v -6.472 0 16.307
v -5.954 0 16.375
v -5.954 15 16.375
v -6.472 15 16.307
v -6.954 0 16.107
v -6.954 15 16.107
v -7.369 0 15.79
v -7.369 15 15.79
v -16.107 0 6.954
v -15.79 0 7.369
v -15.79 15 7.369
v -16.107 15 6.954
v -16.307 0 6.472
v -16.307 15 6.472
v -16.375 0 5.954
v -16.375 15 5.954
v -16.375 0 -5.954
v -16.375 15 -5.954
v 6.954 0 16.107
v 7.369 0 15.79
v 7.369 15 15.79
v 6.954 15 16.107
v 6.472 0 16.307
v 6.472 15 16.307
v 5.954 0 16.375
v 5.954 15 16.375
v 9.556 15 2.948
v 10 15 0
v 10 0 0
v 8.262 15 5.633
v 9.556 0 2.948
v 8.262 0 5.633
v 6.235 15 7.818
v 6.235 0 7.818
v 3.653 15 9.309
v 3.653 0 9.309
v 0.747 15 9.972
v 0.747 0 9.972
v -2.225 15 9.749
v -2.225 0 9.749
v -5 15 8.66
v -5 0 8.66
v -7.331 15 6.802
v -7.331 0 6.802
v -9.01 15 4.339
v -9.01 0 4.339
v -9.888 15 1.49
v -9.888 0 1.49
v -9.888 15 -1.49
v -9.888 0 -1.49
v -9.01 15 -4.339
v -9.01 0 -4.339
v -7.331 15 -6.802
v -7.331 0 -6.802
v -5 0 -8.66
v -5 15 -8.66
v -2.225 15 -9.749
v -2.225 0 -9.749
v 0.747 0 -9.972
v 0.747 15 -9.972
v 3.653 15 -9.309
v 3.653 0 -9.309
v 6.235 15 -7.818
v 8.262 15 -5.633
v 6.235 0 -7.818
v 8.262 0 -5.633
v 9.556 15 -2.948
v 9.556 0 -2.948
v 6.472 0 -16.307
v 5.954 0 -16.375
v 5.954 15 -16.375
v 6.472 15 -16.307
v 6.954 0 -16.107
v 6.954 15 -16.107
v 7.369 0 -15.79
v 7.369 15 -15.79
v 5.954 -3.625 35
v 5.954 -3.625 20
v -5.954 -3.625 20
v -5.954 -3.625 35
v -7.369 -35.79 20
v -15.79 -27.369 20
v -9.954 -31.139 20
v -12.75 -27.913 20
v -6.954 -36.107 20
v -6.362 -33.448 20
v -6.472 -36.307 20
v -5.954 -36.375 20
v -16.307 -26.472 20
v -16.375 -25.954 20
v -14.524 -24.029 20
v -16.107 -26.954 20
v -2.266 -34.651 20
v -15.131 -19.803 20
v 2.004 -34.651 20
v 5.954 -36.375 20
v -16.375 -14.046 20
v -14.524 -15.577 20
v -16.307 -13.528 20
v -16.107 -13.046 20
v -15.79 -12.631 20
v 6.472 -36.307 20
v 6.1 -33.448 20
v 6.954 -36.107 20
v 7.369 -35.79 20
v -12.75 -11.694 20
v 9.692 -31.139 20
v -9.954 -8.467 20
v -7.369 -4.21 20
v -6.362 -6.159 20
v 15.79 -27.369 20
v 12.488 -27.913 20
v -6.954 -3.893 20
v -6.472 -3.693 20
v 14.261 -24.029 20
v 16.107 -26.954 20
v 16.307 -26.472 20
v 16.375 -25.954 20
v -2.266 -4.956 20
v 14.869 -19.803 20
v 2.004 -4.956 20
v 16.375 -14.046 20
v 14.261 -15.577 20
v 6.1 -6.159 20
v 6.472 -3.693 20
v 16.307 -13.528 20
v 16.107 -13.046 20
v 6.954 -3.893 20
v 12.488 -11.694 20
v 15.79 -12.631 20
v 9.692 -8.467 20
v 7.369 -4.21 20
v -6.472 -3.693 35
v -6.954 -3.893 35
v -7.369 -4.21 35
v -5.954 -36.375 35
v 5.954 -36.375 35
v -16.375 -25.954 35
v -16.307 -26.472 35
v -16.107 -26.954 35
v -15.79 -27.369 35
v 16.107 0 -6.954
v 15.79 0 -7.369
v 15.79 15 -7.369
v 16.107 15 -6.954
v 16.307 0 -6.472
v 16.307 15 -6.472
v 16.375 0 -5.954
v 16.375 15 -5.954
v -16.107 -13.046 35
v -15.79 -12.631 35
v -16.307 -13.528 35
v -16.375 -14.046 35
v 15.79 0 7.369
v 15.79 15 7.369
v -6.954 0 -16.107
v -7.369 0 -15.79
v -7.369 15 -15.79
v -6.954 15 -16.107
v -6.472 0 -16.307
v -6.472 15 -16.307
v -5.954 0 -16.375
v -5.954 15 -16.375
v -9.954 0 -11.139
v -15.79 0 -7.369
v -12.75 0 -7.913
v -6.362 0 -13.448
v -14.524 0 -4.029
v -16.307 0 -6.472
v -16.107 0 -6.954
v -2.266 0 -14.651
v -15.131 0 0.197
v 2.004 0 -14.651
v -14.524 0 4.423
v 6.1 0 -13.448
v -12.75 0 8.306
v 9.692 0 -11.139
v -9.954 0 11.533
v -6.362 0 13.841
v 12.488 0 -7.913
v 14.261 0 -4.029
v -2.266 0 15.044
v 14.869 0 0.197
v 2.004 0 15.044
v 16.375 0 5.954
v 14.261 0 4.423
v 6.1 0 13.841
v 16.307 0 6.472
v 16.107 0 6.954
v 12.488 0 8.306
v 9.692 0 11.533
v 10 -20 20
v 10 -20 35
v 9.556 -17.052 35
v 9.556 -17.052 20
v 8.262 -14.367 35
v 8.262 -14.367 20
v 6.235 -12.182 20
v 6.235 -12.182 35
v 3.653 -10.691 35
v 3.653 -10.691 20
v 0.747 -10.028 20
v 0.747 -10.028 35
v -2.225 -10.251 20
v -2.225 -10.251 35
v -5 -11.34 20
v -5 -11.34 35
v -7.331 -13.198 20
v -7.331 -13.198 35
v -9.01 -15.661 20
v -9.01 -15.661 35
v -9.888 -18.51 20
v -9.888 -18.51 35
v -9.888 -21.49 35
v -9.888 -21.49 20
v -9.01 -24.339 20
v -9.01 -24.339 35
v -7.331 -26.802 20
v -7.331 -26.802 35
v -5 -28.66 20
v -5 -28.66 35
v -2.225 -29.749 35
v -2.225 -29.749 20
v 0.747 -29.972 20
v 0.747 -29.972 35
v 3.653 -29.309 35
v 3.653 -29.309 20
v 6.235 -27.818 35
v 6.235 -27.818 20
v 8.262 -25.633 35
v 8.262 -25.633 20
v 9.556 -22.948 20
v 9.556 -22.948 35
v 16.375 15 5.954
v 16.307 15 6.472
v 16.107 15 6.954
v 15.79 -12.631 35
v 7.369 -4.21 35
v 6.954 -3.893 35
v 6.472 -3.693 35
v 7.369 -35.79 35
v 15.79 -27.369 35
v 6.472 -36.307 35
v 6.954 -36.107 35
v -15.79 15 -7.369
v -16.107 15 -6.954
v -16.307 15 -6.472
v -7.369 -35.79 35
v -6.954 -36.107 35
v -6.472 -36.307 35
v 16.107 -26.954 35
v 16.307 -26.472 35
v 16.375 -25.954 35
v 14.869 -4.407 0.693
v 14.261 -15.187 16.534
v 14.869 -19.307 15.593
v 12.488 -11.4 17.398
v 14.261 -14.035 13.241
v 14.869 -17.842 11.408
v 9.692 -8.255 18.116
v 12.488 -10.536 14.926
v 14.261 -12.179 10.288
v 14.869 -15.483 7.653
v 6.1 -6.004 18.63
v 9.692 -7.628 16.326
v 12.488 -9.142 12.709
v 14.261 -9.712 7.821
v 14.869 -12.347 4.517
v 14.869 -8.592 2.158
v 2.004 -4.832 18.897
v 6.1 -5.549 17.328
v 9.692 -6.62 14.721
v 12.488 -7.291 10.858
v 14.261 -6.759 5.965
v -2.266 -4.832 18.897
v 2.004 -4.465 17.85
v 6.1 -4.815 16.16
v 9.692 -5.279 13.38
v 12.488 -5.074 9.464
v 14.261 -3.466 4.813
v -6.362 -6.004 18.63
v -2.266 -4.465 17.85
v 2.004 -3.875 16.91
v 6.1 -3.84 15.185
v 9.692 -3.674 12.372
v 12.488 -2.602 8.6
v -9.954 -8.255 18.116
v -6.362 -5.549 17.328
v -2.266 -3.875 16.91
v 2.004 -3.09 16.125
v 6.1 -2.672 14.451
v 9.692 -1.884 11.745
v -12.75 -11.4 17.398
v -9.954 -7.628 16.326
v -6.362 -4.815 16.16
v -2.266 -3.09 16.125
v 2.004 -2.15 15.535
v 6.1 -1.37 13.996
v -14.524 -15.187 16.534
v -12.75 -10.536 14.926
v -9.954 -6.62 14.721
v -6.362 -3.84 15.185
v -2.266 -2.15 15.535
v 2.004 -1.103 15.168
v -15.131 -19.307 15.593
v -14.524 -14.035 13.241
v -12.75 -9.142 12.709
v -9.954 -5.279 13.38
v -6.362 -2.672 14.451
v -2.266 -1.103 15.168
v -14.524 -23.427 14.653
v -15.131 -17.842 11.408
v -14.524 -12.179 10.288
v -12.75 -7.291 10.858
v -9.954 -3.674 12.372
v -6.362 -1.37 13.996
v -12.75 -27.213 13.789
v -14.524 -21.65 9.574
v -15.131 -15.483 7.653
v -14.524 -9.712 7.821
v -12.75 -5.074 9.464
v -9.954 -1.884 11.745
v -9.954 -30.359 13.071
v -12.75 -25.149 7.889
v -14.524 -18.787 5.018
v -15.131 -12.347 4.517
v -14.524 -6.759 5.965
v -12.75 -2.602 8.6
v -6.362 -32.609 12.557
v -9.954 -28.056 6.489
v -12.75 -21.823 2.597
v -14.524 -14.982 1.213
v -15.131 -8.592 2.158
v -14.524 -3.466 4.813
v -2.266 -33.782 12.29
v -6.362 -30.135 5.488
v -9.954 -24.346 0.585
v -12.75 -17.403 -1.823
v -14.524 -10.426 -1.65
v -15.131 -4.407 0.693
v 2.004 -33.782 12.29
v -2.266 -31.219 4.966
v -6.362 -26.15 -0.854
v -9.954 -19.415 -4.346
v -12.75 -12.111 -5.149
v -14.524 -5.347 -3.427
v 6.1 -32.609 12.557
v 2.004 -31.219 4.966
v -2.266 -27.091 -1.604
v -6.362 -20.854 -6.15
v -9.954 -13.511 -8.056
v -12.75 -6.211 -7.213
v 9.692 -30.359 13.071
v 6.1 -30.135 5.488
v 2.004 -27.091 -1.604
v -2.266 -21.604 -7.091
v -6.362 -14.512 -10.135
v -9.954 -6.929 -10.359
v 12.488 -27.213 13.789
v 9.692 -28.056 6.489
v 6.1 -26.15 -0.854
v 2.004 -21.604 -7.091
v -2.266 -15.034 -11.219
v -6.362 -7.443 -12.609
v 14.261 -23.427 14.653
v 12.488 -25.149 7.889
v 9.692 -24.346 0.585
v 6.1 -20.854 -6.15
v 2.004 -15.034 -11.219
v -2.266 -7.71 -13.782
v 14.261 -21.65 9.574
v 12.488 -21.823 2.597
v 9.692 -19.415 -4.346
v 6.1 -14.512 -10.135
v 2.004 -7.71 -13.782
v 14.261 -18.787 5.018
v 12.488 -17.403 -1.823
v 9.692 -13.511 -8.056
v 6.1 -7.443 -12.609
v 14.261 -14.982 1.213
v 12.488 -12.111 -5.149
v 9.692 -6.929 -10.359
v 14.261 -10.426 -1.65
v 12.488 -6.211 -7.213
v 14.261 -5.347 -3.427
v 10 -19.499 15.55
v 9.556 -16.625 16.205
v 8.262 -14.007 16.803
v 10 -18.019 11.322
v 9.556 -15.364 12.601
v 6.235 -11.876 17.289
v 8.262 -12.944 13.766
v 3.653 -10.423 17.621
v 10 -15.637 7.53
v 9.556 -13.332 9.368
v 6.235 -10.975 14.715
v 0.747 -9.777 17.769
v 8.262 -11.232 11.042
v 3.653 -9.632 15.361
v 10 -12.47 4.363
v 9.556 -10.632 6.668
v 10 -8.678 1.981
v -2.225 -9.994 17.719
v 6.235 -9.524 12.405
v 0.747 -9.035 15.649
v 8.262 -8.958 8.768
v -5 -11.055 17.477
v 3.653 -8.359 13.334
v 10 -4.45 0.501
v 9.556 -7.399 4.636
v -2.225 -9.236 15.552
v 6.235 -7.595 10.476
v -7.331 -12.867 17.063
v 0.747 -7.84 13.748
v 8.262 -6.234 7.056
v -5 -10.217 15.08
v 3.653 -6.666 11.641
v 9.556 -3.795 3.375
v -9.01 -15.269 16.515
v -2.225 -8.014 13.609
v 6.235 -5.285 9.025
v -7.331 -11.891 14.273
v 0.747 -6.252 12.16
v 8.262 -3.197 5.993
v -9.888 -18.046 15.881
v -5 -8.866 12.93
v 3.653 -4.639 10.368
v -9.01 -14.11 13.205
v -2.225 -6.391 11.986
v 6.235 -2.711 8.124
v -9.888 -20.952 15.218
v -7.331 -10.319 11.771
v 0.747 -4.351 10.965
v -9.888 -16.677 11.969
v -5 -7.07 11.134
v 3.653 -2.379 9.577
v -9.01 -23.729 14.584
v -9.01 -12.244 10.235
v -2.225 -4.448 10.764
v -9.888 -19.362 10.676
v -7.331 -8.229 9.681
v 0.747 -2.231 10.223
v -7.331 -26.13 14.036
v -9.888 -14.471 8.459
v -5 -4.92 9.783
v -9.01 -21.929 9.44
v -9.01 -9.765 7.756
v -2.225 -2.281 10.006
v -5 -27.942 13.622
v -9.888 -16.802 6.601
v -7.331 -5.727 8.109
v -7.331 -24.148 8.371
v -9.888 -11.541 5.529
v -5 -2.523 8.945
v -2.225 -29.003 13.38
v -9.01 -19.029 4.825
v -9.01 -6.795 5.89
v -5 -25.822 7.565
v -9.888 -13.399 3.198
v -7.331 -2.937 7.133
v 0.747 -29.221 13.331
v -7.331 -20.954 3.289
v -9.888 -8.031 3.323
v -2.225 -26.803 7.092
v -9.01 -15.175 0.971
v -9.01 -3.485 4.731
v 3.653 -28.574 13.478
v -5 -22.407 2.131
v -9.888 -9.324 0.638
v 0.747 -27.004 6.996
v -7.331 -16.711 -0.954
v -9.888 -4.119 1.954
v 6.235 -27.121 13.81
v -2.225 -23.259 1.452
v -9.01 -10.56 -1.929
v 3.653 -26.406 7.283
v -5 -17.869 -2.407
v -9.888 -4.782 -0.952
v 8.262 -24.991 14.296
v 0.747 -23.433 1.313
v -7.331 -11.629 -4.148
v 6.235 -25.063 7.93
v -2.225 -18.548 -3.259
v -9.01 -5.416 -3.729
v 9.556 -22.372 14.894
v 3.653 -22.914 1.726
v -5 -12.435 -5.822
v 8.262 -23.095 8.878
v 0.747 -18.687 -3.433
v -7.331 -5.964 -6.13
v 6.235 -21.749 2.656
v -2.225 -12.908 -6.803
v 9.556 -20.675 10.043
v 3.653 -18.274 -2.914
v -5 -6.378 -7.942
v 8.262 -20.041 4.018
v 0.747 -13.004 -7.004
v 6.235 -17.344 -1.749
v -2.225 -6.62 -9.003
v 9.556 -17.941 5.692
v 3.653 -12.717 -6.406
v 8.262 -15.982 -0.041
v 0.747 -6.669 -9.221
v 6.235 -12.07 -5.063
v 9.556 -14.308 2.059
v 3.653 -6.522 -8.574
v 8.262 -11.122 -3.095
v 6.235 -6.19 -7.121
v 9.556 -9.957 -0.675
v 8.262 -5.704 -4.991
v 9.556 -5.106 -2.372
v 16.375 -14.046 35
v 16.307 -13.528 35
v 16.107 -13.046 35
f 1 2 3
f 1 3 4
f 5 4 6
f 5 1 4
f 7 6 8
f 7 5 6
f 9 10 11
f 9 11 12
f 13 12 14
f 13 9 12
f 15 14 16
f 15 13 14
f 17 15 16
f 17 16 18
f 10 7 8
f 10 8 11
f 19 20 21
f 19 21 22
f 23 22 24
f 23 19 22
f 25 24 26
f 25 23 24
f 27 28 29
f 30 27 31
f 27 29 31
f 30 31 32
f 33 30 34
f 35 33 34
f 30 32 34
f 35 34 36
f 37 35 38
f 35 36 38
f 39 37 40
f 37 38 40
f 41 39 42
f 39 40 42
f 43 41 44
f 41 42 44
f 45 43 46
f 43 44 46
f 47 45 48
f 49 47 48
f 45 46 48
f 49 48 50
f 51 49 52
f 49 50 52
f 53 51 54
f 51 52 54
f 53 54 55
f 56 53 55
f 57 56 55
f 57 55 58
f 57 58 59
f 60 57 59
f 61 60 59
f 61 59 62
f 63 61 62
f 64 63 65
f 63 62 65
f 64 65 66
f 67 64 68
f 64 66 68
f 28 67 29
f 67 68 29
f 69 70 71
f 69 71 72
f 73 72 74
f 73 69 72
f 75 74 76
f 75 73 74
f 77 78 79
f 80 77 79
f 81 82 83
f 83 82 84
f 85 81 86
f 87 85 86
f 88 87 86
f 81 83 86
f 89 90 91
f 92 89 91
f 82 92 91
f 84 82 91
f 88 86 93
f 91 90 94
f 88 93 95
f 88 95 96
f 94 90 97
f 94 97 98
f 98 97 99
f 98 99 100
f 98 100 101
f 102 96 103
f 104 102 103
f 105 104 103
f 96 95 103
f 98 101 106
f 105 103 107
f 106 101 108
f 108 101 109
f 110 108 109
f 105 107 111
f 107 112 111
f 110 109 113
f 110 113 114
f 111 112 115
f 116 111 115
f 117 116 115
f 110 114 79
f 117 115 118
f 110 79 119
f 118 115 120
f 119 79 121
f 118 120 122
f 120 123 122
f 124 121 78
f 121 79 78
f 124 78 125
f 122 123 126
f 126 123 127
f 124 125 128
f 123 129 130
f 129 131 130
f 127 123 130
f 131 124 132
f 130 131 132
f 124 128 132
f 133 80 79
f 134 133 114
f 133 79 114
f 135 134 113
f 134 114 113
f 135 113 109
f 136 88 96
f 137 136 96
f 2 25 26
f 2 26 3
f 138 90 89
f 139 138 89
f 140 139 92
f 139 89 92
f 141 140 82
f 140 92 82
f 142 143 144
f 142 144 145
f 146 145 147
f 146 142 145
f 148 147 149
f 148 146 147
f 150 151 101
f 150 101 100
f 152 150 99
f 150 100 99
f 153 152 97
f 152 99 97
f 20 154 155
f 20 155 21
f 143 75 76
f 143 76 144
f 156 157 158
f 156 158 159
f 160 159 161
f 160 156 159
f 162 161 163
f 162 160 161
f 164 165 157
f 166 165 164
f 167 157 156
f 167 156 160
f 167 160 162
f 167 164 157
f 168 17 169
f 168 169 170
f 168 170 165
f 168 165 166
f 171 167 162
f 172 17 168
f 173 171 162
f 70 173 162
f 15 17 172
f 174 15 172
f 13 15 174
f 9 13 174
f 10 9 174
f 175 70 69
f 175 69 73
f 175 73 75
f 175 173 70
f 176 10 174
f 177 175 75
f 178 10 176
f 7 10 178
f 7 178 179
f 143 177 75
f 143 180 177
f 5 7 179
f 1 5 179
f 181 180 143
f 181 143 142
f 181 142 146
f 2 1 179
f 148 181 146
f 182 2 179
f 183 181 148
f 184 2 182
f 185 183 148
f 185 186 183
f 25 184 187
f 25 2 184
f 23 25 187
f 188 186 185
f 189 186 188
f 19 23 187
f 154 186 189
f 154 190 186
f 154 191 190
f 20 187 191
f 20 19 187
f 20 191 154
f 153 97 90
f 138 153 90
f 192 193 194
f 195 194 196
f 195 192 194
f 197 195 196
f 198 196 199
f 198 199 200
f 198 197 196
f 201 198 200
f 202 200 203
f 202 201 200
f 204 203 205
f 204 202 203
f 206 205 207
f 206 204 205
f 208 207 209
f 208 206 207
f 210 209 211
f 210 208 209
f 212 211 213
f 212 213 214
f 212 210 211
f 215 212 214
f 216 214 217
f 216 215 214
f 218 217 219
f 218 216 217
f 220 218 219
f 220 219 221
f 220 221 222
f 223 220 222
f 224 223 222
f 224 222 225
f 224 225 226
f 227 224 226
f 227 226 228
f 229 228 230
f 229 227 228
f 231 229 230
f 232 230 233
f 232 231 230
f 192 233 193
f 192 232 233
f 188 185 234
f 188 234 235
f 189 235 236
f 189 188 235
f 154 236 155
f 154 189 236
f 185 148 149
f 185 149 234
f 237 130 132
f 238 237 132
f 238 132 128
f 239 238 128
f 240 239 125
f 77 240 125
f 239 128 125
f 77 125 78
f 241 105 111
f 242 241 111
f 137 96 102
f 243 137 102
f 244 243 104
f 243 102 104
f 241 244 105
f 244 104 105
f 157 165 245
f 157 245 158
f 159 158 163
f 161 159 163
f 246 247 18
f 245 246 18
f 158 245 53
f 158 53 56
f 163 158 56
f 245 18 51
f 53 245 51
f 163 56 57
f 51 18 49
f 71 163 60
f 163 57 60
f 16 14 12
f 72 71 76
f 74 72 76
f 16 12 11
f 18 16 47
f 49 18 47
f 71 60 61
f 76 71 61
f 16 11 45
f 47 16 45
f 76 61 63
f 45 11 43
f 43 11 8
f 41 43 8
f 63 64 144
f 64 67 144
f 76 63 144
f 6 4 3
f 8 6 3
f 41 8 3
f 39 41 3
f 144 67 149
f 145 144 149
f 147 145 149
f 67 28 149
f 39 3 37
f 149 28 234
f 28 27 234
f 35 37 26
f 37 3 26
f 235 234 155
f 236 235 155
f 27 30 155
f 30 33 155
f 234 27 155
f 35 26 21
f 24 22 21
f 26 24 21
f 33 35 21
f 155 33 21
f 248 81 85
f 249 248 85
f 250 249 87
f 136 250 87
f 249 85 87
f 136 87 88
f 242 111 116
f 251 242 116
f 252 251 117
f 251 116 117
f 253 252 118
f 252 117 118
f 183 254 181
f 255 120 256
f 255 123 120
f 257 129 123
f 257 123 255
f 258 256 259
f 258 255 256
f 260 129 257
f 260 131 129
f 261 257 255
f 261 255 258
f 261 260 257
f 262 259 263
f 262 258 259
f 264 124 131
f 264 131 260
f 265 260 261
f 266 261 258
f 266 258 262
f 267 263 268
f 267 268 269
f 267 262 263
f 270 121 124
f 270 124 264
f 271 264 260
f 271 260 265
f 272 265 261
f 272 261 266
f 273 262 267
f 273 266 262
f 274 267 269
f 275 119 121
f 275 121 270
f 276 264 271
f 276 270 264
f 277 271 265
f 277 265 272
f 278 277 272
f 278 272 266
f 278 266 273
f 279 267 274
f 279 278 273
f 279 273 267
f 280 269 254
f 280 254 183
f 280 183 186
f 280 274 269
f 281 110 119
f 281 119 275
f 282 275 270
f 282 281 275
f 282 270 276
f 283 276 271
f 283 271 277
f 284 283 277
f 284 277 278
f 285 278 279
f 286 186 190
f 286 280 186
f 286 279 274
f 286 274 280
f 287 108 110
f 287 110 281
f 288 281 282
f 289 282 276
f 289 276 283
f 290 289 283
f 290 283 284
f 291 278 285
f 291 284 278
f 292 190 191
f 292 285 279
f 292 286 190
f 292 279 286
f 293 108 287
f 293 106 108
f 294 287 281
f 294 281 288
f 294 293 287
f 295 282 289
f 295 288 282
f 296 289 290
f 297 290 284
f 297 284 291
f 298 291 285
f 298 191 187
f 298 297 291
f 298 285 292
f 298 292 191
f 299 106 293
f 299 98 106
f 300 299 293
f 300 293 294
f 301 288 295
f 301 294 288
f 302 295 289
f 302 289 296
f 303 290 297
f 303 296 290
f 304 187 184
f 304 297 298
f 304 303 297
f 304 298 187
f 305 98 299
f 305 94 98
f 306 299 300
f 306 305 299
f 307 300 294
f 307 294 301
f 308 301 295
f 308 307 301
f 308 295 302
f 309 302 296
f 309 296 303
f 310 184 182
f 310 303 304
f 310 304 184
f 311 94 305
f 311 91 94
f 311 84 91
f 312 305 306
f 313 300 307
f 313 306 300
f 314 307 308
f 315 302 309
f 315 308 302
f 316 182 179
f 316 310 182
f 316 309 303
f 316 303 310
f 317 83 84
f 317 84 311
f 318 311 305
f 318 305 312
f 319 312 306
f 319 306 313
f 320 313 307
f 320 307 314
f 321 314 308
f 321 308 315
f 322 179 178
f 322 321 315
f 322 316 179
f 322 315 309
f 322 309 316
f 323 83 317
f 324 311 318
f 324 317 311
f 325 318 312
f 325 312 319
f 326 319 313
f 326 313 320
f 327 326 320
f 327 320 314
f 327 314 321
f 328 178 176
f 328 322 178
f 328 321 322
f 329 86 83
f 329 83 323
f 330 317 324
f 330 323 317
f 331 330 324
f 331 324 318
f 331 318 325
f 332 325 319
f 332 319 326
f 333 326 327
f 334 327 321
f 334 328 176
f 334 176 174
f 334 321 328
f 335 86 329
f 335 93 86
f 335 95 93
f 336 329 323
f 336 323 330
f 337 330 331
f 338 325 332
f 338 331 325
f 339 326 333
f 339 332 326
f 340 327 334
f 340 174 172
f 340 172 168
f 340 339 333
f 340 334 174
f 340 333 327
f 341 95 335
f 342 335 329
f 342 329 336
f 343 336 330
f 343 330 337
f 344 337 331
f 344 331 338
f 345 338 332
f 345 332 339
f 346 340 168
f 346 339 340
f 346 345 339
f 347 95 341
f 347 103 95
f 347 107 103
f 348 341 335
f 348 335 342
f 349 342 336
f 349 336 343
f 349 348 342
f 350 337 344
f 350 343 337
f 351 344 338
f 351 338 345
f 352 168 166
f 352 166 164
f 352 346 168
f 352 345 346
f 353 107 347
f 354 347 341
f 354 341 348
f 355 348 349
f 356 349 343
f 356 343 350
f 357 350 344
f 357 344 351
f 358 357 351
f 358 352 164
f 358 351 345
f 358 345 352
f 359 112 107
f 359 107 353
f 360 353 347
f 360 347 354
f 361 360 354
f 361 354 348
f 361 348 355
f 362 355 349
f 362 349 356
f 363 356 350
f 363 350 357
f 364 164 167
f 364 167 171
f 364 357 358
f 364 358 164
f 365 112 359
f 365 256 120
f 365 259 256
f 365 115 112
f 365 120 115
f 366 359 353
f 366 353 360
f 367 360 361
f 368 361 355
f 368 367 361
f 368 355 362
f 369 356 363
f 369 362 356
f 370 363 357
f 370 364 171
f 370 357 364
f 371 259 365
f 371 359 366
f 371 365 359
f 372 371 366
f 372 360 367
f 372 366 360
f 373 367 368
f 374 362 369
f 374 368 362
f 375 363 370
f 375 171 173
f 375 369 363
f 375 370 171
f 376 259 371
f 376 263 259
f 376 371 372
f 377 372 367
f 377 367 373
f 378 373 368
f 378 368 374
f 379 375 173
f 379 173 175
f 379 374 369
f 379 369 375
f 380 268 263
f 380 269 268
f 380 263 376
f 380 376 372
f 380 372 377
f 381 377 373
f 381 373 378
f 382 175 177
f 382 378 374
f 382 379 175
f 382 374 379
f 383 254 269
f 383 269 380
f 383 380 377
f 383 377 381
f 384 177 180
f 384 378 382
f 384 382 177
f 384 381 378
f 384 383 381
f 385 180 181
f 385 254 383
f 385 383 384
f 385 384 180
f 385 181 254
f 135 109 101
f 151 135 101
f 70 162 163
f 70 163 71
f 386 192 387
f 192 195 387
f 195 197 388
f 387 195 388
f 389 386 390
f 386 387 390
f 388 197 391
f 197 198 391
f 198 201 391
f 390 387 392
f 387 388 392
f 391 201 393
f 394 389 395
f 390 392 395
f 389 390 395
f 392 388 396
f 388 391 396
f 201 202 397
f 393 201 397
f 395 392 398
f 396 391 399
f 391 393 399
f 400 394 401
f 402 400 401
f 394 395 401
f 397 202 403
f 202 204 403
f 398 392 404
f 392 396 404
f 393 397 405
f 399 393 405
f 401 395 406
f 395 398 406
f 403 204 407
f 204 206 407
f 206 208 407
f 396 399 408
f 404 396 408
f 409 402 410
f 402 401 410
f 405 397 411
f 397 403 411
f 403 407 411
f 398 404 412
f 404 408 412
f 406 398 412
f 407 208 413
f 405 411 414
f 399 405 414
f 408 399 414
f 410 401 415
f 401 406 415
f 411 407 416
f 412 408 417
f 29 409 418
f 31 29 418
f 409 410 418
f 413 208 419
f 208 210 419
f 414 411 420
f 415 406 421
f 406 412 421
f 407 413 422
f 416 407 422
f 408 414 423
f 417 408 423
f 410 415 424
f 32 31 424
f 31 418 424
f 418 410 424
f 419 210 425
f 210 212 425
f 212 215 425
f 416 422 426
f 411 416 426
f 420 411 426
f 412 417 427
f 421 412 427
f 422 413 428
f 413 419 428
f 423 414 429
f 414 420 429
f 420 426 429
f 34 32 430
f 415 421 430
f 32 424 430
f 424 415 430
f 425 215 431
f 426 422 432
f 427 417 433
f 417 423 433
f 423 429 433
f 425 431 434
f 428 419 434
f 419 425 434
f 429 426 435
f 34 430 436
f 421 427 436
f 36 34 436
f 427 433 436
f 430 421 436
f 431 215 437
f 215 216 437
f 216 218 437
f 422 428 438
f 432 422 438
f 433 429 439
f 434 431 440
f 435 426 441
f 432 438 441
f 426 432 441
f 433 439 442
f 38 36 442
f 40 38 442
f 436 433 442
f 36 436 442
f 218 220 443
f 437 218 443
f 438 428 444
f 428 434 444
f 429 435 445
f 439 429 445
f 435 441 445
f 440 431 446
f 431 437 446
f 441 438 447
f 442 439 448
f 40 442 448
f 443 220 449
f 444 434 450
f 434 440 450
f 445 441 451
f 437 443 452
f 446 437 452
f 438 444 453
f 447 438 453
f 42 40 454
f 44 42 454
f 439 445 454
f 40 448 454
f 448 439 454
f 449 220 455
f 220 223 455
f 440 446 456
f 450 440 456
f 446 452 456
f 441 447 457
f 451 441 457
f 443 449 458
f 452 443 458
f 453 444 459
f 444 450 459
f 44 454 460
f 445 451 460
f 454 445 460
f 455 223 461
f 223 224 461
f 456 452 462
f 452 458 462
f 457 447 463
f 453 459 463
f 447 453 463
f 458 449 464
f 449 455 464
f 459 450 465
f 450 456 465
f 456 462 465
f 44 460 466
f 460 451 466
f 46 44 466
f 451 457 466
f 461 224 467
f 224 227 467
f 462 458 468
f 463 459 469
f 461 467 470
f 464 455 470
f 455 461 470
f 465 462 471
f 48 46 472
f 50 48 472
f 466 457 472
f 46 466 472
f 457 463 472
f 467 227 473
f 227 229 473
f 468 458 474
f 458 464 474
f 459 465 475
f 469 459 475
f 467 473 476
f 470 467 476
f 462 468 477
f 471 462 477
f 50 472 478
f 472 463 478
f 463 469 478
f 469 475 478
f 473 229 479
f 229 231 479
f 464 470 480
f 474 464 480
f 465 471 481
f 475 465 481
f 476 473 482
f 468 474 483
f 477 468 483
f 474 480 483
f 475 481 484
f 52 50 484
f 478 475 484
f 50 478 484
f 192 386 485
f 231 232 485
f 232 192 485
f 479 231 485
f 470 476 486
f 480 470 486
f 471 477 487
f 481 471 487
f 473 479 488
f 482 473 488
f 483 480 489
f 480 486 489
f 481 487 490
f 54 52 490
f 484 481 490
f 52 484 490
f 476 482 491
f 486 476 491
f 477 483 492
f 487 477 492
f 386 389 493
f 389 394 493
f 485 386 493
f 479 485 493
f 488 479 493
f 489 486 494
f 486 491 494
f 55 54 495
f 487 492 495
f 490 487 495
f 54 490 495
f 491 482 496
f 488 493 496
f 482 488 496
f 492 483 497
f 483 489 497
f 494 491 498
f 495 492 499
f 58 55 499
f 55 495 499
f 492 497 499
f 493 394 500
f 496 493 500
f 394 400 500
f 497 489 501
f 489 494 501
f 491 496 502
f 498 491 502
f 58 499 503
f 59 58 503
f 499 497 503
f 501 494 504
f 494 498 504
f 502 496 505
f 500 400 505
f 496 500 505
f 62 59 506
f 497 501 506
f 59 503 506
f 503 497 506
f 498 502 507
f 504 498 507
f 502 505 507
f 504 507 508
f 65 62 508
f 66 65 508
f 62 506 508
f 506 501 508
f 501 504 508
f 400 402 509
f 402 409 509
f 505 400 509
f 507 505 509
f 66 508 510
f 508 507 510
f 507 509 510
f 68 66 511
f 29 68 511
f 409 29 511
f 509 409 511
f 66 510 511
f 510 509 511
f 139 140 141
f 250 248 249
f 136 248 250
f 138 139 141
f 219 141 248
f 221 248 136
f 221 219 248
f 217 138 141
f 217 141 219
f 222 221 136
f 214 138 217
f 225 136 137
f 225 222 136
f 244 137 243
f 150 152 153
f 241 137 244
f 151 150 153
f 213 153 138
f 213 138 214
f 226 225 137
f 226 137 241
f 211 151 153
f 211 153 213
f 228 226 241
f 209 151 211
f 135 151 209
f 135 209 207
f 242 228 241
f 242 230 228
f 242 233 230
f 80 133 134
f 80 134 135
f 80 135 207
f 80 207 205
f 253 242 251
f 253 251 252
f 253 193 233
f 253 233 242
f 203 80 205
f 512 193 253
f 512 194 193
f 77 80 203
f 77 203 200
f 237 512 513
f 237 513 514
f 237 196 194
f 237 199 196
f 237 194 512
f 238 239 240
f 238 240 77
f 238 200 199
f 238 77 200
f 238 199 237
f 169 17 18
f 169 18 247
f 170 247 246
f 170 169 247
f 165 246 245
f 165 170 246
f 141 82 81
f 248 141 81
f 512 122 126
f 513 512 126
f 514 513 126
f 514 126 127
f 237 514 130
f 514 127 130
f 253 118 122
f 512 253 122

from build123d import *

# Parameters (mm, degrees)
F0_R     = 15
F0_R_2   = 10
F3_R     = 10
F4_DEPTH = 15
F5_R     = 15
F5_R_2   = 10
F6_DEPTH = 15


with BuildPart() as f2:
    # F2: sweep along a path in F1
    with BuildLine(Plane.YZ) as f2_path:
        ThreePointArc((-20, 20), (-14.1421356237, 5.8578643763), (0, 0))
    # F0 (on Front) → F2 (sweep)
    with BuildSketch(Plane.XZ):
        with Locations((-0.1311794548, 0.1967689097)):
            Circle(F0_R)
        Circle(F0_R_2, mode=Mode.SUBTRACT)
    sweep(path=f2_path.line)

    # F3 (on Front) → F4 (join)
    with BuildSketch(Plane.XZ):
        with BuildLine():
            Line((5.9544622317, 16.3753434763), (-5.9544622317, 16.3753434763))
            ThreePointArc((-5.9544622317, 16.3753434763), (-6.7198290964, 16.2231025413), (-7.368675794, 15.7895570387))
            Line((-7.368675794, 15.7895570387), (-15.7895570387, 7.368675794))
            ThreePointArc((-15.7895570387, 7.368675794), (-16.2231025413, 6.7198290964), (-16.3753434763, 5.9544622317))
            Line((-16.3753434763, 5.9544622317), (-16.3753434763, -5.9544622317))
            ThreePointArc((-16.3753434763, -5.9544622317), (-16.2231025413, -6.7198290964), (-15.7895570387, -7.368675794))
            Line((-15.7895570387, -7.368675794), (-7.368675794, -15.7895570387))
            ThreePointArc((-7.368675794, -15.7895570387), (-6.7198290964, -16.2231025413), (-5.9544622317, -16.3753434763))
            Line((-5.9544622317, -16.3753434763), (5.9544622317, -16.3753434763))
            ThreePointArc((5.9544622317, -16.3753434763), (6.7198290964, -16.2231025413), (7.368675794, -15.7895570387))
            Line((7.368675794, -15.7895570387), (15.7895570387, -7.368675794))
            ThreePointArc((15.7895570387, -7.368675794), (16.2231025413, -6.7198290964), (16.3753434763, -5.9544622317))
            Line((16.3753434763, -5.9544622317), (16.3753434763, 5.9544622317))
            ThreePointArc((16.3753434763, 5.9544622317), (16.2231025413, 6.7198290964), (15.7895570387, 7.368675794))
            Line((15.7895570387, 7.368675794), (7.368675794, 15.7895570387))
            ThreePointArc((7.368675794, 15.7895570387), (6.7198290964, 16.2231025413), (5.9544622317, 16.3753434763))
        make_face()
        Circle(F3_R, mode=Mode.SUBTRACT)
    extrude(amount=-F4_DEPTH)

    # F5 (on face) → F6 (join)
    with BuildSketch(Plane.XY.offset(20)):
        with BuildLine():
            Line((5.9544622317, -3.6246565237), (-5.9544622317, -3.6246565237))
            ThreePointArc((-5.9544622317, -3.6246565237), (-6.7198290964, -3.7768974587), (-7.368675794, -4.2104429613))
            Line((-7.368675794, -4.2104429613), (-15.7895570387, -12.631324206))
            ThreePointArc((-15.7895570387, -12.631324206), (-16.2231025413, -13.2801709036), (-16.3753434763, -14.0455377683))
            Line((-16.3753434763, -14.0455377683), (-16.3753434763, -25.9544622317))
            ThreePointArc((-16.3753434763, -25.9544622317), (-16.2231025413, -26.7198290964), (-15.7895570387, -27.368675794))
            Line((-15.7895570387, -27.368675794), (-7.368675794, -35.7895570387))
            ThreePointArc((-7.368675794, -35.7895570387), (-6.7198290964, -36.2231025413), (-5.9544622317, -36.3753434763))
            Line((-5.9544622317, -36.3753434763), (5.9544622317, -36.3753434763))
            ThreePointArc((5.9544622317, -36.3753434763), (6.7198290964, -36.2231025413), (7.368675794, -35.7895570387))
            Line((7.368675794, -35.7895570387), (15.7895570387, -27.368675794))
            ThreePointArc((15.7895570387, -27.368675794), (16.2231025413, -26.7198290964), (16.3753434763, -25.9544622317))
            Line((16.3753434763, -25.9544622317), (16.3753434763, -14.0455377683))
            ThreePointArc((16.3753434763, -14.0455377683), (16.2231025413, -13.2801709036), (15.7895570387, -12.631324206))
            Line((15.7895570387, -12.631324206), (7.368675794, -4.2104429613))
            ThreePointArc((7.368675794, -4.2104429613), (6.7198290964, -3.7768974587), (5.9544622317, -3.6246565237))
        make_face()
        with Locations((-0.1311794548, -19.8032310903)):
            Circle(F5_R, mode=Mode.SUBTRACT)
        with Locations((-0.1311794548, -19.8032310903)):
            Circle(F5_R)
        with Locations((0, -20)):
            Circle(F5_R_2, mode=Mode.SUBTRACT)
    extrude(amount=F6_DEPTH)


solid = f2.part
